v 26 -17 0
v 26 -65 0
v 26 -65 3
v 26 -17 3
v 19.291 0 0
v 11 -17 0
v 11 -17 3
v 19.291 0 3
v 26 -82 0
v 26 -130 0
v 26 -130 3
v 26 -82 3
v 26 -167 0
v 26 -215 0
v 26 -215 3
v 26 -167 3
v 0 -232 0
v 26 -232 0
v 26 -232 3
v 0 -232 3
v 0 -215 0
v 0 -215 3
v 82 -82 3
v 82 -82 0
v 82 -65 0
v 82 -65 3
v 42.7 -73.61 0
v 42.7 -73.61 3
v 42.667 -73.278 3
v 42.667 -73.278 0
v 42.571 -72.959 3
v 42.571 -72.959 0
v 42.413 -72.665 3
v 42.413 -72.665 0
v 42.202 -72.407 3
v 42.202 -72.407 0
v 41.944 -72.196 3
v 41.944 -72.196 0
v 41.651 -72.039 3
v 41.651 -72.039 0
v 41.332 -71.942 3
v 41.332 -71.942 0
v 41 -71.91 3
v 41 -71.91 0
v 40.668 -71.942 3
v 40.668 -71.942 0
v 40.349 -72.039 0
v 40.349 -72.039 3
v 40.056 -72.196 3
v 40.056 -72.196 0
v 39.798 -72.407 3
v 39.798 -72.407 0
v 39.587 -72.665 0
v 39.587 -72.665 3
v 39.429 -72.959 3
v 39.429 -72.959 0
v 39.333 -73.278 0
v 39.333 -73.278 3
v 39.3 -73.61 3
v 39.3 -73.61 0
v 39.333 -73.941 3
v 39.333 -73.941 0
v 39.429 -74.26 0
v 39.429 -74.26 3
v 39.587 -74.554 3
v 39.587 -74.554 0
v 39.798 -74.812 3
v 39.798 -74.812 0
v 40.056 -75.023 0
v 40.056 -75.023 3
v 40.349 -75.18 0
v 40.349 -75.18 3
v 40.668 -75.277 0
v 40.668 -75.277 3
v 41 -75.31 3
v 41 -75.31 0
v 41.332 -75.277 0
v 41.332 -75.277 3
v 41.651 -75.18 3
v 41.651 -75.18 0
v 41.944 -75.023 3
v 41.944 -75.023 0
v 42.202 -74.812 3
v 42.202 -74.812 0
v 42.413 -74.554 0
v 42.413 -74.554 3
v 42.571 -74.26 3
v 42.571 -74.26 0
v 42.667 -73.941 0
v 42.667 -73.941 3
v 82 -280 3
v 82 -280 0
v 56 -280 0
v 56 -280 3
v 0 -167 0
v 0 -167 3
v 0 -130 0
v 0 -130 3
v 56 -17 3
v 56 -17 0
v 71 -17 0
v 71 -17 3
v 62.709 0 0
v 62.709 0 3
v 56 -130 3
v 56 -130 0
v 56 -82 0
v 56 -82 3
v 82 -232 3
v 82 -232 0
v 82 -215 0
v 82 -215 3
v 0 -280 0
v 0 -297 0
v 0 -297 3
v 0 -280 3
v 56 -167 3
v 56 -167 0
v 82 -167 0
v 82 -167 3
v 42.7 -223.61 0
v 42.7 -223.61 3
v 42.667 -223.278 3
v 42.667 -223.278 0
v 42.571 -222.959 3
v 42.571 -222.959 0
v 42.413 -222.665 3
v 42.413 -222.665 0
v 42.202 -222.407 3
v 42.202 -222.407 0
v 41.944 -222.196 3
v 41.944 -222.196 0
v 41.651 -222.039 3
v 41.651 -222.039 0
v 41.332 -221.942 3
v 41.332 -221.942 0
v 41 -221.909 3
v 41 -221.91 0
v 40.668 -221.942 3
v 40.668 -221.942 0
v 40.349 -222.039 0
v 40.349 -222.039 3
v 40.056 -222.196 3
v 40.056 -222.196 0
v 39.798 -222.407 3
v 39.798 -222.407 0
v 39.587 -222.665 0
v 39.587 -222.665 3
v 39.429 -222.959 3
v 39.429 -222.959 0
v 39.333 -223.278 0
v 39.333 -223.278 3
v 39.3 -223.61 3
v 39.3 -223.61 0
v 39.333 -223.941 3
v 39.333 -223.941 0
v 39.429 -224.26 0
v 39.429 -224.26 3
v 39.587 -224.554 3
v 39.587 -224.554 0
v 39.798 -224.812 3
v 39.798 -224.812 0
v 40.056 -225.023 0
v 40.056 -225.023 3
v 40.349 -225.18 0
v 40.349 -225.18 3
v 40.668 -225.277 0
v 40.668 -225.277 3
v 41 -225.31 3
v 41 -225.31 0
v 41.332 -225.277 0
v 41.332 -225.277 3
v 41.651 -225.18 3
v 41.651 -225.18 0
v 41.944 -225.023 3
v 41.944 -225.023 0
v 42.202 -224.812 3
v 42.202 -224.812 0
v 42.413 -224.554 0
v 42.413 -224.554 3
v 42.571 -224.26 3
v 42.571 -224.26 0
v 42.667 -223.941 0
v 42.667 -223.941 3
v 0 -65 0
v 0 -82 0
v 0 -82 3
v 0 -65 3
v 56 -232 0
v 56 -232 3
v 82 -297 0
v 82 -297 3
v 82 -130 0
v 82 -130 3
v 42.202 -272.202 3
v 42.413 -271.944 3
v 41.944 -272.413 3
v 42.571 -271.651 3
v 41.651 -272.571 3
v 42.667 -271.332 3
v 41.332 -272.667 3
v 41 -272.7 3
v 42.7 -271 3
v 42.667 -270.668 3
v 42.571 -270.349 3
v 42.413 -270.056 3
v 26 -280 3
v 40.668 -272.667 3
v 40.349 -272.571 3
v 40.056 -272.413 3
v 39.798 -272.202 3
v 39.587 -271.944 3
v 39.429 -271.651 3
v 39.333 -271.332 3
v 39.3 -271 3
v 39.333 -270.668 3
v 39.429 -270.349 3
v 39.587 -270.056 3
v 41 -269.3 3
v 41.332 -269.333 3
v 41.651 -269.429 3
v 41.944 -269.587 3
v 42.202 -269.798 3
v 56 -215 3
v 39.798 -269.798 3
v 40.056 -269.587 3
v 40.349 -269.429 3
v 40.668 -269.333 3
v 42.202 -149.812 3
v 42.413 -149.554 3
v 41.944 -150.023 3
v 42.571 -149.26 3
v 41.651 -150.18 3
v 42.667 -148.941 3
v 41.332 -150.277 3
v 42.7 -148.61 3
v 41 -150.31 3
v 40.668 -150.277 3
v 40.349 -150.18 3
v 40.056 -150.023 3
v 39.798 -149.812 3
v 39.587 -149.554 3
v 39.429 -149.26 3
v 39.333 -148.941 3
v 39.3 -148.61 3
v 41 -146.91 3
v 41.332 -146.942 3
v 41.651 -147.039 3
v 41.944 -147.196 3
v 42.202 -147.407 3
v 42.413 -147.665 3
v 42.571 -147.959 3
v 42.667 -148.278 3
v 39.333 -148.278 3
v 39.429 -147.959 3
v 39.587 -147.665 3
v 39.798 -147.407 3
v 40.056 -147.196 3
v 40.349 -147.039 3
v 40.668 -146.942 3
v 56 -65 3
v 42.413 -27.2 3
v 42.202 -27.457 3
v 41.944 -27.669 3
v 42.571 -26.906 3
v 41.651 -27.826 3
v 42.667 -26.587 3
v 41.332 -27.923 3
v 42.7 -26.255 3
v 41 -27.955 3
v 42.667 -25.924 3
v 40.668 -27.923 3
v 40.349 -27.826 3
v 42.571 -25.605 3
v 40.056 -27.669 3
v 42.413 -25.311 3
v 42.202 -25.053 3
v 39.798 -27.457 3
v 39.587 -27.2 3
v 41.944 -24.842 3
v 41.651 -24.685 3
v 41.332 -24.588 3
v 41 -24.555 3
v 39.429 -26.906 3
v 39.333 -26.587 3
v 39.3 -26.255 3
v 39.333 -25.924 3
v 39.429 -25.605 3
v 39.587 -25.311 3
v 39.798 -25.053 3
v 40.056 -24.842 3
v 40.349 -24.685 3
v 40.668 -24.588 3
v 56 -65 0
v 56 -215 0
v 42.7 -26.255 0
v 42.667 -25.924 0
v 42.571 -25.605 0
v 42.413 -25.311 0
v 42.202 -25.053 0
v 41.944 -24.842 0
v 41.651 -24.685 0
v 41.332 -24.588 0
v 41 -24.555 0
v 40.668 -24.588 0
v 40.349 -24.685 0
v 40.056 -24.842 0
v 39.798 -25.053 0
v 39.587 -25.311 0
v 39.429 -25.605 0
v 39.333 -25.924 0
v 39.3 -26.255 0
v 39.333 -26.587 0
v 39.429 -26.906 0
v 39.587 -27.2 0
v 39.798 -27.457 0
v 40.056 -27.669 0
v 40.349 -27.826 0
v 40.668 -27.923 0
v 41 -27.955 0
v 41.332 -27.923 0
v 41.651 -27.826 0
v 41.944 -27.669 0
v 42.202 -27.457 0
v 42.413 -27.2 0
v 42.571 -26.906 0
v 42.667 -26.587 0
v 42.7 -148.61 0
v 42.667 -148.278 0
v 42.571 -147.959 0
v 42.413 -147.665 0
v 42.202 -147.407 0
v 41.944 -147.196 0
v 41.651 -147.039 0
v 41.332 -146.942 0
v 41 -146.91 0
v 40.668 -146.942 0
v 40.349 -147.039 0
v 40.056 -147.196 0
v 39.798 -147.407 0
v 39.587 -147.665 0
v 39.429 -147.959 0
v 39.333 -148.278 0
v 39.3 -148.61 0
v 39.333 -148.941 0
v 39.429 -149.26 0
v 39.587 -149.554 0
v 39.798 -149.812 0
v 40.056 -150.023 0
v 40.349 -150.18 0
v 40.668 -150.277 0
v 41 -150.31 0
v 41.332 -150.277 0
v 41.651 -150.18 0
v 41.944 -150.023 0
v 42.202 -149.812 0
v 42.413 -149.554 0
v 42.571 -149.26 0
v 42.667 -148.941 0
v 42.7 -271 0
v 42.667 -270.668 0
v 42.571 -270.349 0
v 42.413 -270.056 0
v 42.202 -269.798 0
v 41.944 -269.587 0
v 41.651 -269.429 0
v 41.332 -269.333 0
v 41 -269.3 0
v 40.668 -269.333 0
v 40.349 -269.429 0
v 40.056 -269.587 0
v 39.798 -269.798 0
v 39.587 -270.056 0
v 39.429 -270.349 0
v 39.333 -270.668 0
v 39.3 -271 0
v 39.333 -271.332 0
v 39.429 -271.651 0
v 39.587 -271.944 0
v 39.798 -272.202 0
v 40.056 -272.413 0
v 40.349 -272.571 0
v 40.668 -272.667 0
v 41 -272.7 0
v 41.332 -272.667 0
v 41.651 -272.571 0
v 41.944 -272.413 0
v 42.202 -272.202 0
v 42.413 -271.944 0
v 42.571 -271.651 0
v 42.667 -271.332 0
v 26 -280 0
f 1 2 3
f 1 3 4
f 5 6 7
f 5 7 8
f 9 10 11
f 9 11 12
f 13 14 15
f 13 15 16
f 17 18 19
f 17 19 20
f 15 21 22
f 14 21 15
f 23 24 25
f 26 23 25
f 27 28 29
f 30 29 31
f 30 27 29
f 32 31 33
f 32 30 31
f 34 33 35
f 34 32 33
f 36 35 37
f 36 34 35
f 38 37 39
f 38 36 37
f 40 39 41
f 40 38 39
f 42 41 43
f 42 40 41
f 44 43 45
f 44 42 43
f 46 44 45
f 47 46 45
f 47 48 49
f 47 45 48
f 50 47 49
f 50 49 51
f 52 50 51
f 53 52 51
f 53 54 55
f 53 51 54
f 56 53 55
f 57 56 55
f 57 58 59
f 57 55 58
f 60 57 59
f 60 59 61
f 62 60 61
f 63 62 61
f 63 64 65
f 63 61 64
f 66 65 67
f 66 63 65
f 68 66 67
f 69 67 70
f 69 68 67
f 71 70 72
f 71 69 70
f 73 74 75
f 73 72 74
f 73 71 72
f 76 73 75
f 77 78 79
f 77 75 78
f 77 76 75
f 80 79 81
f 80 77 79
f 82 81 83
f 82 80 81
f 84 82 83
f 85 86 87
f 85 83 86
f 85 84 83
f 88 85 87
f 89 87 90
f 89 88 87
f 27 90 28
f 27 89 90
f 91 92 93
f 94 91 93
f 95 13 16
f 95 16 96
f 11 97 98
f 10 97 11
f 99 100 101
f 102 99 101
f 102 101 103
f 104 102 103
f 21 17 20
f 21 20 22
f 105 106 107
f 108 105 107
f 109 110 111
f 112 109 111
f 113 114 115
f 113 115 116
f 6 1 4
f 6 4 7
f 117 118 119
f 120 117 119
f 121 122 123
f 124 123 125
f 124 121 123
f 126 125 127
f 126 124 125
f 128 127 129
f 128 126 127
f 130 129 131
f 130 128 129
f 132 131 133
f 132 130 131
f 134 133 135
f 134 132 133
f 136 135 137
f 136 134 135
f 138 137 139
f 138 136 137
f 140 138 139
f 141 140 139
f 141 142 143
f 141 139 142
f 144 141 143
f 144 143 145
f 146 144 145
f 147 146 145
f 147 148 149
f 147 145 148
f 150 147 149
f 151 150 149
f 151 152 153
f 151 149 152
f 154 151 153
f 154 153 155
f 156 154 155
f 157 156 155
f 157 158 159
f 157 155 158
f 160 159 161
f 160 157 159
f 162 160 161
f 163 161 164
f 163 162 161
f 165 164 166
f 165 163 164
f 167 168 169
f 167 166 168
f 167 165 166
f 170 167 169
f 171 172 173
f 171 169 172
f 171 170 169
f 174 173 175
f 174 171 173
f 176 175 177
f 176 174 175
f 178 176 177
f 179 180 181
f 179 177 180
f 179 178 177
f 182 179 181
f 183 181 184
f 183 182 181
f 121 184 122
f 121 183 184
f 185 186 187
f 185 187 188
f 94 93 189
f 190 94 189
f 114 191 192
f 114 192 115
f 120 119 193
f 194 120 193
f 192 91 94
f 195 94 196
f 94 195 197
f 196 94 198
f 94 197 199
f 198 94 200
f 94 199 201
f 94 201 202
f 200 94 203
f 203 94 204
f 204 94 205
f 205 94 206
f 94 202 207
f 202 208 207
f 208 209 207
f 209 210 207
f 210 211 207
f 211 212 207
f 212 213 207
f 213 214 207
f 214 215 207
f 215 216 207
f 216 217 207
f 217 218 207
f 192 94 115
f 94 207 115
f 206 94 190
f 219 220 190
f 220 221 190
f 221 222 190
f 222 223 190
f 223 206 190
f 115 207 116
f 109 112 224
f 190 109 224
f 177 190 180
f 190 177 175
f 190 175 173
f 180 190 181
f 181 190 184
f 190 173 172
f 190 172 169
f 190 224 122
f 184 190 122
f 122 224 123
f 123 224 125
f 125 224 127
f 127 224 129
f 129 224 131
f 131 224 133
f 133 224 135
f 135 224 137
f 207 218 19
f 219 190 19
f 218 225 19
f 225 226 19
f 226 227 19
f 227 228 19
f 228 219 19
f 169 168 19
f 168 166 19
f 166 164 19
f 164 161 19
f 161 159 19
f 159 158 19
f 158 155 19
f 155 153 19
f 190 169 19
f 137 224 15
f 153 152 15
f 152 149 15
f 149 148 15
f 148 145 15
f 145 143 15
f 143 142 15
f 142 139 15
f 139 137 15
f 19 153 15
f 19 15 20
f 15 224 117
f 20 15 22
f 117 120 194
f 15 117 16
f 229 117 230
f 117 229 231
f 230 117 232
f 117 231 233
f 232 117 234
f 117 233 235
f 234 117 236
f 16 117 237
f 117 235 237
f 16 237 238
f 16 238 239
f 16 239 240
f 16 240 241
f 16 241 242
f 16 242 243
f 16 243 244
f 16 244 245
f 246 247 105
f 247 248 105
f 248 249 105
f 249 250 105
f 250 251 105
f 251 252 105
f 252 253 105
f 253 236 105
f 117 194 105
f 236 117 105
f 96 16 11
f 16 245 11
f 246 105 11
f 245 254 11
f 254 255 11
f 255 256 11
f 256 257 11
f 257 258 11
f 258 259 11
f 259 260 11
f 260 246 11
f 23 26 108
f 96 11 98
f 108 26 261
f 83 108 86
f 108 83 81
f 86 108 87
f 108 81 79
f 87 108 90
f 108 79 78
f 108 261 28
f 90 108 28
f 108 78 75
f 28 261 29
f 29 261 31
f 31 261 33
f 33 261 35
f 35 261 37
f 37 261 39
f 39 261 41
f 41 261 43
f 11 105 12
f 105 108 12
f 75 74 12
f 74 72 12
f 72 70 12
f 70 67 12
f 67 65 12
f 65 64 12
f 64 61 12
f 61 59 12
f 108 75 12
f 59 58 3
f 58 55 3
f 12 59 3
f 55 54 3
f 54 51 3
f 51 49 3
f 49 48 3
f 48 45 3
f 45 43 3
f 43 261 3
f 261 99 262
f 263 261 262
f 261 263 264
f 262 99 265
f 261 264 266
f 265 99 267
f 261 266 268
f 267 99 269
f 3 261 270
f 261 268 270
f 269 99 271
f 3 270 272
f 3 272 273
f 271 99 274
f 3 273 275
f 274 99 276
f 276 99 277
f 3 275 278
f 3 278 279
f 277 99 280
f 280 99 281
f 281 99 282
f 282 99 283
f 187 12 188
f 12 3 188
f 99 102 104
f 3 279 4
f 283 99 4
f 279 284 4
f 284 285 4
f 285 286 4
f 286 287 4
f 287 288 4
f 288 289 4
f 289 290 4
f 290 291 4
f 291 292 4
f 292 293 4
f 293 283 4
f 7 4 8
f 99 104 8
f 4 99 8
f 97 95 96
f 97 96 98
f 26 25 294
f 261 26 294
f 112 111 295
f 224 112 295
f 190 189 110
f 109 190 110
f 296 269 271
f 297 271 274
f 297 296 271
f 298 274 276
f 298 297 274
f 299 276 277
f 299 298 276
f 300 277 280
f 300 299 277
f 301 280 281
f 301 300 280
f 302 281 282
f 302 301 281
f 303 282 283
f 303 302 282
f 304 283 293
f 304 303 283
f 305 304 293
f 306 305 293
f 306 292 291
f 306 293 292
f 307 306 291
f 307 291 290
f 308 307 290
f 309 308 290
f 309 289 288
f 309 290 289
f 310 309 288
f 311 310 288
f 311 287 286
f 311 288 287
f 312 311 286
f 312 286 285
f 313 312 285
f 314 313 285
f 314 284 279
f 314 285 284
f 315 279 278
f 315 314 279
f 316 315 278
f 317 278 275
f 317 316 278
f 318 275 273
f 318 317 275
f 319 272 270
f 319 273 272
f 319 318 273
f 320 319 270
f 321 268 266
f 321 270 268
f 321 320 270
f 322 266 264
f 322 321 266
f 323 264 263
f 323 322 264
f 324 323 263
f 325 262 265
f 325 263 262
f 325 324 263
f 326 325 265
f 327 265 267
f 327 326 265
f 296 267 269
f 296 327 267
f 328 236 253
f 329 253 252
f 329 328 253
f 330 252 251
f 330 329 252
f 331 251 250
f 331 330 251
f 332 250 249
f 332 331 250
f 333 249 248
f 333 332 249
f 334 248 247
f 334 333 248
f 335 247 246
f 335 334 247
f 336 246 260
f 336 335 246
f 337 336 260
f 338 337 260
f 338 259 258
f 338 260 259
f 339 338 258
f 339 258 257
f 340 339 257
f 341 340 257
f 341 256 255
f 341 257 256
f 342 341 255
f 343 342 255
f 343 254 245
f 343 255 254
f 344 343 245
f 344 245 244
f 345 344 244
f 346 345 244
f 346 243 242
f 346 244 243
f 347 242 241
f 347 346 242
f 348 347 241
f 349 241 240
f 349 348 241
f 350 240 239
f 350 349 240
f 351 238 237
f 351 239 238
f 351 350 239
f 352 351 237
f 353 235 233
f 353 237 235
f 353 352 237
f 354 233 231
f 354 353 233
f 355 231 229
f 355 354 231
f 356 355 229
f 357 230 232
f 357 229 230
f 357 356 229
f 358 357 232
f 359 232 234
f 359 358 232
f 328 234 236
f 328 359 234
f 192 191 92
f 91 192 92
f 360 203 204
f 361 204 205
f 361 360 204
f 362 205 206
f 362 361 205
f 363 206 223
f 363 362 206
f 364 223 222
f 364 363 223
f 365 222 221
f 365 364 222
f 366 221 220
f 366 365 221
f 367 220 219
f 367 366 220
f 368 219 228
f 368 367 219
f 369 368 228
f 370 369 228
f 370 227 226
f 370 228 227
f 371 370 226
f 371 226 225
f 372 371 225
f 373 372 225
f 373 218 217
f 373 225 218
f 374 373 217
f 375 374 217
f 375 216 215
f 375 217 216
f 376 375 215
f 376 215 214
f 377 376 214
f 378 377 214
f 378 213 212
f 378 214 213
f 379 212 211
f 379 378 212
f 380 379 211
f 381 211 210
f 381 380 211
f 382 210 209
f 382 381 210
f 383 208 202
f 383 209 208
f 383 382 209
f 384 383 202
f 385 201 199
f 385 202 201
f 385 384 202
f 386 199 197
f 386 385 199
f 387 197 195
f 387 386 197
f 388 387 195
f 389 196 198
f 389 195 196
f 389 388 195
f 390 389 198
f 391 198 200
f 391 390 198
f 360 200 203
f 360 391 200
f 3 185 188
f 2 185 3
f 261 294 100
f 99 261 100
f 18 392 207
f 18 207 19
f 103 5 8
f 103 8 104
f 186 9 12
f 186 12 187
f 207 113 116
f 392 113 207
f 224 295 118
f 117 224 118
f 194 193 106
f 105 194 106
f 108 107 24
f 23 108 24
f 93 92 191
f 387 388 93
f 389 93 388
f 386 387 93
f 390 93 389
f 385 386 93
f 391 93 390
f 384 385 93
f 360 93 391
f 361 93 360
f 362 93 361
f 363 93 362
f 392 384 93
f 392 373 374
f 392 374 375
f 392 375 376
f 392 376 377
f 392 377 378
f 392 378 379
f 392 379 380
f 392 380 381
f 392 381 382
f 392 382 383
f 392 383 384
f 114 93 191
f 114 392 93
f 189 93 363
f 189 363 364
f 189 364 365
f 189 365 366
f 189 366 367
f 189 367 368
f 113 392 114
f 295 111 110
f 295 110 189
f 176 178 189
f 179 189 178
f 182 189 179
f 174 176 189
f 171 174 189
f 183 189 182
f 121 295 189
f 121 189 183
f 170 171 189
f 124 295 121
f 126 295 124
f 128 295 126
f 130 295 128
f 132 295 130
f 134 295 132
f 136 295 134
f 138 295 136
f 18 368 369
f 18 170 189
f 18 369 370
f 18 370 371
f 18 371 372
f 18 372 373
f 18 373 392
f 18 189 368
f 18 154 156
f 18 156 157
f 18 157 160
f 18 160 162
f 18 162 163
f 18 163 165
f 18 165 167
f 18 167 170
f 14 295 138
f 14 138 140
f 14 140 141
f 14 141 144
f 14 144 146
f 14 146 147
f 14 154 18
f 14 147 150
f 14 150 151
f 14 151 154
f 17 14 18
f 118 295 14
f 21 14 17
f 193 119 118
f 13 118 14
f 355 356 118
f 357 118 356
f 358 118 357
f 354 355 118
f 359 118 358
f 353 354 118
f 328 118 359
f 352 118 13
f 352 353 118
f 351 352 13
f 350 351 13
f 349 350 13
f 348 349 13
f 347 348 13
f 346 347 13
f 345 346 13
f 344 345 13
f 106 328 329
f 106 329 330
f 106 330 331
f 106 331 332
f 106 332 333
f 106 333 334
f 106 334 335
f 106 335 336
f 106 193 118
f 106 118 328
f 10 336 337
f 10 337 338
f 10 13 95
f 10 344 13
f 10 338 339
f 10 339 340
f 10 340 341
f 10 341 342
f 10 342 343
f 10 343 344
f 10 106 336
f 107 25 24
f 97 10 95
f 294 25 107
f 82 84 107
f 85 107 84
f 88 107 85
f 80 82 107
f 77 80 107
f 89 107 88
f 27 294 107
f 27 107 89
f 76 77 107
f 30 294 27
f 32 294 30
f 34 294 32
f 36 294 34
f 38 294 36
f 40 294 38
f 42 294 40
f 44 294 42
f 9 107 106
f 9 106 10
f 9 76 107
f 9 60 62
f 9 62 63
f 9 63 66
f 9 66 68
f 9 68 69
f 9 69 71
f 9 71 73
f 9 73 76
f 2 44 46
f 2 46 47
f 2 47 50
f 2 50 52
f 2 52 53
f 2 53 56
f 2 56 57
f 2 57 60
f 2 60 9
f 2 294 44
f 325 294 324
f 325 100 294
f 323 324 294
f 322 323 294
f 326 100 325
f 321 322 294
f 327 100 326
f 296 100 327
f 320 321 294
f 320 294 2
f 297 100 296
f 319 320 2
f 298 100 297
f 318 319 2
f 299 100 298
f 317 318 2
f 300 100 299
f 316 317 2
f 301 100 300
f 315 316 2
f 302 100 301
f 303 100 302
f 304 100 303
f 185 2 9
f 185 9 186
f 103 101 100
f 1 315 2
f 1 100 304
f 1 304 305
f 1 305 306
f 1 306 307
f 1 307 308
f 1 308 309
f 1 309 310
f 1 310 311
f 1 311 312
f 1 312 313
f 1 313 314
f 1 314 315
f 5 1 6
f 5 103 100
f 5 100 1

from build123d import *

# Parameters (mm, degrees)
PAD_DEPTH         = 3
SKETCH001_R       = 1.7
POCKET_DEPTH      = 0.001
POCKET_DEPTH_BACK = 3.001


with BuildPart() as part:
    # Sketch → Pad (new body)
    with BuildSketch(Plane.XY):
        Polygon((0, 33), (41, 33), (41, 50), (15, 50), (15, 98), (41, 98), (41, 115), (15, 115), (15, 163), (41, 163), (41, 200), (15, 200), (15, 248), (41, 248), (41, 265), (15, 265), (15, 313), (30, 313), (21.708546, 330), (0, 330), align=None)
    pad = extrude(amount=PAD_DEPTH)

    # Mirrored: Pad across Sketch V_Axis
    add(pad.mirror(Plane(origin=(0, 0, 0), x_dir=(0, 0, 1), z_dir=(1, 0, 0))))

    # Sketch001 → Pocket (cut, two sides)
    with BuildSketch(Plane.XY) as pocket_sk:
        with Locations((0, 59)):
            Circle(SKETCH001_R)
        with Locations((0, 106.3905)):
            Circle(SKETCH001_R)
        with Locations((0, 181.3905)):
            Circle(SKETCH001_R)
        with Locations((0, 256.3905)):
            Circle(SKETCH001_R)
        with Locations((0, 303.7447)):
            Circle(SKETCH001_R)
    extrude(amount=-POCKET_DEPTH, mode=Mode.SUBTRACT)
    extrude(pocket_sk.sketch, amount=POCKET_DEPTH_BACK, mode=Mode.SUBTRACT)


with BuildPart() as part_1:
    # Clone063 placement: moved
    add(part.part.moved(Location((41, -330, 0))))


solid = part_1.part
